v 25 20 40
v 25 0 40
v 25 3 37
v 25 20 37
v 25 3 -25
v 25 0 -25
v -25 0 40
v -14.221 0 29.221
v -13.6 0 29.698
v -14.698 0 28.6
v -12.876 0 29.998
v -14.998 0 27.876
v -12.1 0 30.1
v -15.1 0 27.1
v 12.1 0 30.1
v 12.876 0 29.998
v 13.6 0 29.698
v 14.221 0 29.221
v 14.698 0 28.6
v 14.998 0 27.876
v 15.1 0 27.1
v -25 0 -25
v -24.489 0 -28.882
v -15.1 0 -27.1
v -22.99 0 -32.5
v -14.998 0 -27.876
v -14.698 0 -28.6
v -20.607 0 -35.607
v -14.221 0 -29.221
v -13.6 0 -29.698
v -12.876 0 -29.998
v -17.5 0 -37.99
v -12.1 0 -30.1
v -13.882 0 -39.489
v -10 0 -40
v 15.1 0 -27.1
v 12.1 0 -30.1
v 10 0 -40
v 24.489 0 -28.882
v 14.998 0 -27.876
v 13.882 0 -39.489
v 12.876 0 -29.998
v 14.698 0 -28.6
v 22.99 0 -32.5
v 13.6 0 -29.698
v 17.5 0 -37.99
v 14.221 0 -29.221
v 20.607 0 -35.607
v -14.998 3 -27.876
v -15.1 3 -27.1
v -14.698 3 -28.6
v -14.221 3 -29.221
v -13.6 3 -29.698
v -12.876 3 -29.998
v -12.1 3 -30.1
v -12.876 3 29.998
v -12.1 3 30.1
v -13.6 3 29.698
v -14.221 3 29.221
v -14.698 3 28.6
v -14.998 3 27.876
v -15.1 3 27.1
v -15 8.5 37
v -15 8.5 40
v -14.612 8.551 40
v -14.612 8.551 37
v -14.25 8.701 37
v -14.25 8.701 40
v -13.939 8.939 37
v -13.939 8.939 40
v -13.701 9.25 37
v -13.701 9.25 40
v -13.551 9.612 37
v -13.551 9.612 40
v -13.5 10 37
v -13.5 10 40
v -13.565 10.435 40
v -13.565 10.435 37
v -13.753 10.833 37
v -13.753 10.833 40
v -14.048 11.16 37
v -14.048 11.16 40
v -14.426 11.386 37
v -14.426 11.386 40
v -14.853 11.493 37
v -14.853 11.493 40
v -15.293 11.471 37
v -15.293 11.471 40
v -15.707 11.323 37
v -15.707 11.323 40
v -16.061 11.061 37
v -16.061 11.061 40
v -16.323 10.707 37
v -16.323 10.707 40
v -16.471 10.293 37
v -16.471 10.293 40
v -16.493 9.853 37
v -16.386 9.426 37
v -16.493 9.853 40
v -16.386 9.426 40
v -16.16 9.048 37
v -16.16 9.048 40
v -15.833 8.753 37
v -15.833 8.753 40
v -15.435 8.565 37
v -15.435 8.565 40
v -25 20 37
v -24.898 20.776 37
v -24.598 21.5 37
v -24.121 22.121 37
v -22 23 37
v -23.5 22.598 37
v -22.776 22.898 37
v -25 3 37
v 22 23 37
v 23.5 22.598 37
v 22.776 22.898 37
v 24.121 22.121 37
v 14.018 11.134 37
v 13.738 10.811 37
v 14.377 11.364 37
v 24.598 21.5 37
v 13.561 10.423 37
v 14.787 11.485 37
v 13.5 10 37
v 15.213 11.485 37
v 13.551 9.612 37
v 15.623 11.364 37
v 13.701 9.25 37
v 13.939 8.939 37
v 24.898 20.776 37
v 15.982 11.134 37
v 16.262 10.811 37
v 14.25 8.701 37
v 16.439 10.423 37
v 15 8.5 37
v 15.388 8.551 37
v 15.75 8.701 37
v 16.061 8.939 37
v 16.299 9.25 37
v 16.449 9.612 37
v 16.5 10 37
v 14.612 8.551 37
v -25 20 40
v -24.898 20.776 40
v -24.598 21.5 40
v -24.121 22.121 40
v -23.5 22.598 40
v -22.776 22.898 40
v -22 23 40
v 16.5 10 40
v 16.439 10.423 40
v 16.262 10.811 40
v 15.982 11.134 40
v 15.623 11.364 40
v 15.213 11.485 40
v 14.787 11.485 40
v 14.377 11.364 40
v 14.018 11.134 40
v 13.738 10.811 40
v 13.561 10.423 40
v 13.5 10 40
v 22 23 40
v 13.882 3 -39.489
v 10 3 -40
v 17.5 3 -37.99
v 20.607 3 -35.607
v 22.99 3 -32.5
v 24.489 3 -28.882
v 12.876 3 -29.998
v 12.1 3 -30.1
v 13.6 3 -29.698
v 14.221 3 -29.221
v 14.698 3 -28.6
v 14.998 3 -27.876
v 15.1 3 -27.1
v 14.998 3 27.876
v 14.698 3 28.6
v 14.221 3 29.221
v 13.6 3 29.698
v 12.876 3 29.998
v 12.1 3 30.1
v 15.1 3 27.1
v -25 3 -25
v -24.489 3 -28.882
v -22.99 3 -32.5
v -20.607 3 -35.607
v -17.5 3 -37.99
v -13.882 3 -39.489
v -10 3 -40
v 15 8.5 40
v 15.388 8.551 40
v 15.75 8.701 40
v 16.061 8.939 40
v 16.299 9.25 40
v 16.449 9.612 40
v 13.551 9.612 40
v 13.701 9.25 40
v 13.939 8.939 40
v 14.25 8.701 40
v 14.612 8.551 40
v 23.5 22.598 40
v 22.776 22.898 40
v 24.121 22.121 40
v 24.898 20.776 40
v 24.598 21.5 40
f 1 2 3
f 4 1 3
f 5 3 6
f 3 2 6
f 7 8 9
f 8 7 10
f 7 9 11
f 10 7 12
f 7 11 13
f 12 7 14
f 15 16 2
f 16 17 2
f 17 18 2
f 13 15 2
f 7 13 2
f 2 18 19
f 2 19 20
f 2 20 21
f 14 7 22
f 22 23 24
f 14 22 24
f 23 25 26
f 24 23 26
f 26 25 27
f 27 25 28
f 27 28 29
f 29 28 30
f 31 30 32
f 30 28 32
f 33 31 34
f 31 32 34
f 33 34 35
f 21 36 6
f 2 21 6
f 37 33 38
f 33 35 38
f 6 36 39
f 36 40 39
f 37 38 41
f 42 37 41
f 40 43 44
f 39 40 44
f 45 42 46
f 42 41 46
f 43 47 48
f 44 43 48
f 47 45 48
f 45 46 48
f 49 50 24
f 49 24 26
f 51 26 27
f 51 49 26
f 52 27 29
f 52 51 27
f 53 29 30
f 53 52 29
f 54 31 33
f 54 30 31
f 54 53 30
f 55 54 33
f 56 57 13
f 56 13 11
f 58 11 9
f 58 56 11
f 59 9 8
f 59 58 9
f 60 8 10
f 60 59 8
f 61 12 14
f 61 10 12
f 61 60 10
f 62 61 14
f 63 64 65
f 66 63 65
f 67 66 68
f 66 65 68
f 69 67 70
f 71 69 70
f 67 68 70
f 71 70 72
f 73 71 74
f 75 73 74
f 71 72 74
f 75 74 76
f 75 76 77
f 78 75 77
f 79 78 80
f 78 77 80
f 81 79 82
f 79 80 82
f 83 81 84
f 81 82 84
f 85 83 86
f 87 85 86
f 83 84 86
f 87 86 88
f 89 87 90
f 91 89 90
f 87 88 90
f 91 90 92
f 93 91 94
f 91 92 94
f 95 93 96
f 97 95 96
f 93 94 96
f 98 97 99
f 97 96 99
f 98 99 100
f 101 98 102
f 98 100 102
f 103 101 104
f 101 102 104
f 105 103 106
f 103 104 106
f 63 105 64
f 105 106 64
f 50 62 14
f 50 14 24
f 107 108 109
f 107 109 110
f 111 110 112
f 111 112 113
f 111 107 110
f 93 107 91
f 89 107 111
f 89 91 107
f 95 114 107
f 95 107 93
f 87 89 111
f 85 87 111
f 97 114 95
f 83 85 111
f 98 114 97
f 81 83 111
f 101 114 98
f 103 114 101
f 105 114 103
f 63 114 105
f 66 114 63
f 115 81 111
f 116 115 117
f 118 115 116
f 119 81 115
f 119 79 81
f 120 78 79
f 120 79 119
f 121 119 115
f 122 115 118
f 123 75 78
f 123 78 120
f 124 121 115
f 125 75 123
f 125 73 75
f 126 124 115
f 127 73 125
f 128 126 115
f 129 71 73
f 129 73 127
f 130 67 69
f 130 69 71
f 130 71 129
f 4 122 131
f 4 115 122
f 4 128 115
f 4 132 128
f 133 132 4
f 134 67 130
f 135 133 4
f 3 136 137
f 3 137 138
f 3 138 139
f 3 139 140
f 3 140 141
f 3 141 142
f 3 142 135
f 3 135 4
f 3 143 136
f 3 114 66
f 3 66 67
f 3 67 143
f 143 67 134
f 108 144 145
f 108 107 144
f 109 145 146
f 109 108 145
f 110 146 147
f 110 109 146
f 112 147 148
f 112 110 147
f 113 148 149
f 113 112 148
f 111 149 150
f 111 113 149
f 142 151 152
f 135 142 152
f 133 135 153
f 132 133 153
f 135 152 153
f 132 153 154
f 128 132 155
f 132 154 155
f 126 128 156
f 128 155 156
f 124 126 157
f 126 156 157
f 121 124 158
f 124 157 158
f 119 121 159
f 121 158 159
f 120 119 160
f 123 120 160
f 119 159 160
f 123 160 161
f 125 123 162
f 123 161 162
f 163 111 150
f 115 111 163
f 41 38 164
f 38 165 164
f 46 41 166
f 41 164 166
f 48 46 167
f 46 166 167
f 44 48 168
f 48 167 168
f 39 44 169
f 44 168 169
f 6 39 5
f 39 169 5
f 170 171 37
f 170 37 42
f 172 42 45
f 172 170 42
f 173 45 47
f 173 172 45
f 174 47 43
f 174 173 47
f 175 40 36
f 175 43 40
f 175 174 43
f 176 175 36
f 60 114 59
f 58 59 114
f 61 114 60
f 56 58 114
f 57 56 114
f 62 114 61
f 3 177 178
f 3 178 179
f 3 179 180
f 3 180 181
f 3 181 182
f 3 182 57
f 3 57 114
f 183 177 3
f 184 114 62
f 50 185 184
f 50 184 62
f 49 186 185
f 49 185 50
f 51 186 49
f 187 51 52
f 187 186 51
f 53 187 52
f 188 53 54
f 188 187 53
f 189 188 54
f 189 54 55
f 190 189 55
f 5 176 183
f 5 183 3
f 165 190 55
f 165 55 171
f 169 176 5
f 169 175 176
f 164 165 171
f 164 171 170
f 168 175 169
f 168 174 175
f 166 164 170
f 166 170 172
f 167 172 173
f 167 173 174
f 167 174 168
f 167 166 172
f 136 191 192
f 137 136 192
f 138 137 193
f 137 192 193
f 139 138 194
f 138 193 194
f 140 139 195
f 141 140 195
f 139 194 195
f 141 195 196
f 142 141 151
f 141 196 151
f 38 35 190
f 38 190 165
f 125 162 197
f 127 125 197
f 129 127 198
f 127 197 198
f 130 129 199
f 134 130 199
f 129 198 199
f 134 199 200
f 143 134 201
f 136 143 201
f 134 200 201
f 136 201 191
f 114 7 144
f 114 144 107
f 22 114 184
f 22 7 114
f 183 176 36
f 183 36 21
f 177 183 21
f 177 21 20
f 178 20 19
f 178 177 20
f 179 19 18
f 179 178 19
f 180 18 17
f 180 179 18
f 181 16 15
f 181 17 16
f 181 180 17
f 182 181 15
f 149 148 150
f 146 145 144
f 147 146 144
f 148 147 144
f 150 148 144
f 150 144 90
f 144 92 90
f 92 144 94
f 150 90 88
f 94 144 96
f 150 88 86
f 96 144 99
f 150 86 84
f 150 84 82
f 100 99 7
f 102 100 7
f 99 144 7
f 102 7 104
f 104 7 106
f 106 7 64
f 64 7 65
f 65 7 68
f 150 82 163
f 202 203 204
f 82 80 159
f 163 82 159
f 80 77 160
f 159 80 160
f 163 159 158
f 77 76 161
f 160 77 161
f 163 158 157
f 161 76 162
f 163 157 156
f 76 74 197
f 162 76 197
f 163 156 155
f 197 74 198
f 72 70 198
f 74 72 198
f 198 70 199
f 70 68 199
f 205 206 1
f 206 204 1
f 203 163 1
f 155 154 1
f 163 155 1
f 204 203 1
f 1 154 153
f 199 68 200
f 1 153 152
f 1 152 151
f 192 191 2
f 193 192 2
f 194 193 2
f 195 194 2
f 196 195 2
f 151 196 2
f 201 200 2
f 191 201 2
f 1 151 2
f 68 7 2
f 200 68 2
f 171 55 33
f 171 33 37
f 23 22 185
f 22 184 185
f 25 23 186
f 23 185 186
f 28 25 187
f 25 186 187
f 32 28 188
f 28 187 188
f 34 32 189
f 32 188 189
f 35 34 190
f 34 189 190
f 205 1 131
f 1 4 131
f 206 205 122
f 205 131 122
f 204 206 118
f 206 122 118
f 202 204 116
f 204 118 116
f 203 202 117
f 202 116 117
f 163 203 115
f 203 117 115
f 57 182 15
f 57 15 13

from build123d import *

# Parameters (mm, degrees)
SKETCH1_W           = 50
SKETCH1_H           = 80
BOSS_EXTRUDE1_DEPTH = 3
SKETCH2_W           = 50
SKETCH2_H           = 3
BOSS_EXTRUDE2_DEPTH = 20
FILLET1_R           = 3
FILLET2_R           = 15
CUT_EXTRUDE1_DEPTH  = 4
CUT_EXTRUDE2_DEPTH  = 81


with BuildPart() as part:
    # Sketch1 → Boss-Extrude1 (new body)
    with BuildSketch(Plane(origin=(0, 0, 0), x_dir=(1, 0, 0), z_dir=(0, 1, 0))):
        Rectangle(SKETCH1_W, SKETCH1_H)
    extrude(amount=BOSS_EXTRUDE1_DEPTH)

    # Sketch2 → Boss-Extrude2 (add)
    with BuildSketch(Plane(origin=(0, 3, 0), x_dir=(1, 0, 0), z_dir=(0, 1, 0))):
        with Locations((0, -38.5)):
            Rectangle(SKETCH2_W, SKETCH2_H)
    extrude(amount=BOSS_EXTRUDE2_DEPTH)

    # Fillet1
    fillet1_edges = [part.edges().sort_by_distance(p)[0] for p in [
        (-25, 23, 38.5),
        (25, 23, 38.5),
    ]]
    fillet(fillet1_edges, radius=FILLET1_R)

    # Fillet2
    fillet2_edges = [part.edges().sort_by_distance(p)[0] for p in [
        (-25, 1.5, -40),
        (25, 1.5, -40),
    ]]
    fillet(fillet2_edges, radius=FILLET2_R)

    # Sketch3 → Cut-Extrude1 (cut, through all)
    with BuildSketch(Plane(origin=(0, 3, 0), x_dir=(1, 0, 0), z_dir=(0, 1, 0))):
        with BuildLine():
            Line((-12.1, 30.1), (12.1, 30.1))
            ThreePointArc((12.1, 30.1), (14.221320344, 29.221320344), (15.1, 27.1))
            Line((15.1, 27.1), (15.1, -27.1))
            ThreePointArc((15.1, -27.1), (14.221320344, -29.221320344), (12.1, -30.1))
            Line((12.1, -30.1), (-12.1, -30.1))
            ThreePointArc((-12.1, -30.1), (-14.221320344, -29.221320344), (-15.1, -27.1))
            Line((-15.1, -27.1), (-15.1, 27.1))
            ThreePointArc((-15.1, 27.1), (-14.221320344, 29.221320344), (-12.1, 30.1))
        make_face()
    extrude(amount=-CUT_EXTRUDE1_DEPTH, mode=Mode.SUBTRACT)

    # Sketch4 → Cut-Extrude2 (cut, through all)
    with BuildSketch(Plane.XY.offset(40)):
        with BuildLine():
            Line((-15, 8.5), (-15, 10))
            Line((-15, 10), (-13.5, 10))
            ThreePointArc((-13.5, 10), (-16.060660172, 11.060660172), (-15, 8.5))
        make_face()
        with BuildLine():
            Line((-13.5, 10), (-15, 10))
            Line((-15, 10), (-15, 8.5))
            ThreePointArc((-15, 8.5), (-13.939339828, 8.939339828), (-13.5, 10))
        make_face()
        with BuildLine():
            ThreePointArc((16.5, 10), (15, 11.5), (13.5, 10))
            Line((13.5, 10), (15, 10))
            Line((15, 10), (15, 8.5))
            ThreePointArc((15, 8.5), (16.060660172, 8.939339828), (16.5, 10))
        make_face()
        with BuildLine():
            Line((15, 10), (13.5, 10))
            ThreePointArc((13.5, 10), (13.939339828, 8.939339828), (15, 8.5))
            Line((15, 8.5), (15, 10))
        make_face()
    extrude(amount=-CUT_EXTRUDE2_DEPTH, mode=Mode.SUBTRACT)


solid = part.part
